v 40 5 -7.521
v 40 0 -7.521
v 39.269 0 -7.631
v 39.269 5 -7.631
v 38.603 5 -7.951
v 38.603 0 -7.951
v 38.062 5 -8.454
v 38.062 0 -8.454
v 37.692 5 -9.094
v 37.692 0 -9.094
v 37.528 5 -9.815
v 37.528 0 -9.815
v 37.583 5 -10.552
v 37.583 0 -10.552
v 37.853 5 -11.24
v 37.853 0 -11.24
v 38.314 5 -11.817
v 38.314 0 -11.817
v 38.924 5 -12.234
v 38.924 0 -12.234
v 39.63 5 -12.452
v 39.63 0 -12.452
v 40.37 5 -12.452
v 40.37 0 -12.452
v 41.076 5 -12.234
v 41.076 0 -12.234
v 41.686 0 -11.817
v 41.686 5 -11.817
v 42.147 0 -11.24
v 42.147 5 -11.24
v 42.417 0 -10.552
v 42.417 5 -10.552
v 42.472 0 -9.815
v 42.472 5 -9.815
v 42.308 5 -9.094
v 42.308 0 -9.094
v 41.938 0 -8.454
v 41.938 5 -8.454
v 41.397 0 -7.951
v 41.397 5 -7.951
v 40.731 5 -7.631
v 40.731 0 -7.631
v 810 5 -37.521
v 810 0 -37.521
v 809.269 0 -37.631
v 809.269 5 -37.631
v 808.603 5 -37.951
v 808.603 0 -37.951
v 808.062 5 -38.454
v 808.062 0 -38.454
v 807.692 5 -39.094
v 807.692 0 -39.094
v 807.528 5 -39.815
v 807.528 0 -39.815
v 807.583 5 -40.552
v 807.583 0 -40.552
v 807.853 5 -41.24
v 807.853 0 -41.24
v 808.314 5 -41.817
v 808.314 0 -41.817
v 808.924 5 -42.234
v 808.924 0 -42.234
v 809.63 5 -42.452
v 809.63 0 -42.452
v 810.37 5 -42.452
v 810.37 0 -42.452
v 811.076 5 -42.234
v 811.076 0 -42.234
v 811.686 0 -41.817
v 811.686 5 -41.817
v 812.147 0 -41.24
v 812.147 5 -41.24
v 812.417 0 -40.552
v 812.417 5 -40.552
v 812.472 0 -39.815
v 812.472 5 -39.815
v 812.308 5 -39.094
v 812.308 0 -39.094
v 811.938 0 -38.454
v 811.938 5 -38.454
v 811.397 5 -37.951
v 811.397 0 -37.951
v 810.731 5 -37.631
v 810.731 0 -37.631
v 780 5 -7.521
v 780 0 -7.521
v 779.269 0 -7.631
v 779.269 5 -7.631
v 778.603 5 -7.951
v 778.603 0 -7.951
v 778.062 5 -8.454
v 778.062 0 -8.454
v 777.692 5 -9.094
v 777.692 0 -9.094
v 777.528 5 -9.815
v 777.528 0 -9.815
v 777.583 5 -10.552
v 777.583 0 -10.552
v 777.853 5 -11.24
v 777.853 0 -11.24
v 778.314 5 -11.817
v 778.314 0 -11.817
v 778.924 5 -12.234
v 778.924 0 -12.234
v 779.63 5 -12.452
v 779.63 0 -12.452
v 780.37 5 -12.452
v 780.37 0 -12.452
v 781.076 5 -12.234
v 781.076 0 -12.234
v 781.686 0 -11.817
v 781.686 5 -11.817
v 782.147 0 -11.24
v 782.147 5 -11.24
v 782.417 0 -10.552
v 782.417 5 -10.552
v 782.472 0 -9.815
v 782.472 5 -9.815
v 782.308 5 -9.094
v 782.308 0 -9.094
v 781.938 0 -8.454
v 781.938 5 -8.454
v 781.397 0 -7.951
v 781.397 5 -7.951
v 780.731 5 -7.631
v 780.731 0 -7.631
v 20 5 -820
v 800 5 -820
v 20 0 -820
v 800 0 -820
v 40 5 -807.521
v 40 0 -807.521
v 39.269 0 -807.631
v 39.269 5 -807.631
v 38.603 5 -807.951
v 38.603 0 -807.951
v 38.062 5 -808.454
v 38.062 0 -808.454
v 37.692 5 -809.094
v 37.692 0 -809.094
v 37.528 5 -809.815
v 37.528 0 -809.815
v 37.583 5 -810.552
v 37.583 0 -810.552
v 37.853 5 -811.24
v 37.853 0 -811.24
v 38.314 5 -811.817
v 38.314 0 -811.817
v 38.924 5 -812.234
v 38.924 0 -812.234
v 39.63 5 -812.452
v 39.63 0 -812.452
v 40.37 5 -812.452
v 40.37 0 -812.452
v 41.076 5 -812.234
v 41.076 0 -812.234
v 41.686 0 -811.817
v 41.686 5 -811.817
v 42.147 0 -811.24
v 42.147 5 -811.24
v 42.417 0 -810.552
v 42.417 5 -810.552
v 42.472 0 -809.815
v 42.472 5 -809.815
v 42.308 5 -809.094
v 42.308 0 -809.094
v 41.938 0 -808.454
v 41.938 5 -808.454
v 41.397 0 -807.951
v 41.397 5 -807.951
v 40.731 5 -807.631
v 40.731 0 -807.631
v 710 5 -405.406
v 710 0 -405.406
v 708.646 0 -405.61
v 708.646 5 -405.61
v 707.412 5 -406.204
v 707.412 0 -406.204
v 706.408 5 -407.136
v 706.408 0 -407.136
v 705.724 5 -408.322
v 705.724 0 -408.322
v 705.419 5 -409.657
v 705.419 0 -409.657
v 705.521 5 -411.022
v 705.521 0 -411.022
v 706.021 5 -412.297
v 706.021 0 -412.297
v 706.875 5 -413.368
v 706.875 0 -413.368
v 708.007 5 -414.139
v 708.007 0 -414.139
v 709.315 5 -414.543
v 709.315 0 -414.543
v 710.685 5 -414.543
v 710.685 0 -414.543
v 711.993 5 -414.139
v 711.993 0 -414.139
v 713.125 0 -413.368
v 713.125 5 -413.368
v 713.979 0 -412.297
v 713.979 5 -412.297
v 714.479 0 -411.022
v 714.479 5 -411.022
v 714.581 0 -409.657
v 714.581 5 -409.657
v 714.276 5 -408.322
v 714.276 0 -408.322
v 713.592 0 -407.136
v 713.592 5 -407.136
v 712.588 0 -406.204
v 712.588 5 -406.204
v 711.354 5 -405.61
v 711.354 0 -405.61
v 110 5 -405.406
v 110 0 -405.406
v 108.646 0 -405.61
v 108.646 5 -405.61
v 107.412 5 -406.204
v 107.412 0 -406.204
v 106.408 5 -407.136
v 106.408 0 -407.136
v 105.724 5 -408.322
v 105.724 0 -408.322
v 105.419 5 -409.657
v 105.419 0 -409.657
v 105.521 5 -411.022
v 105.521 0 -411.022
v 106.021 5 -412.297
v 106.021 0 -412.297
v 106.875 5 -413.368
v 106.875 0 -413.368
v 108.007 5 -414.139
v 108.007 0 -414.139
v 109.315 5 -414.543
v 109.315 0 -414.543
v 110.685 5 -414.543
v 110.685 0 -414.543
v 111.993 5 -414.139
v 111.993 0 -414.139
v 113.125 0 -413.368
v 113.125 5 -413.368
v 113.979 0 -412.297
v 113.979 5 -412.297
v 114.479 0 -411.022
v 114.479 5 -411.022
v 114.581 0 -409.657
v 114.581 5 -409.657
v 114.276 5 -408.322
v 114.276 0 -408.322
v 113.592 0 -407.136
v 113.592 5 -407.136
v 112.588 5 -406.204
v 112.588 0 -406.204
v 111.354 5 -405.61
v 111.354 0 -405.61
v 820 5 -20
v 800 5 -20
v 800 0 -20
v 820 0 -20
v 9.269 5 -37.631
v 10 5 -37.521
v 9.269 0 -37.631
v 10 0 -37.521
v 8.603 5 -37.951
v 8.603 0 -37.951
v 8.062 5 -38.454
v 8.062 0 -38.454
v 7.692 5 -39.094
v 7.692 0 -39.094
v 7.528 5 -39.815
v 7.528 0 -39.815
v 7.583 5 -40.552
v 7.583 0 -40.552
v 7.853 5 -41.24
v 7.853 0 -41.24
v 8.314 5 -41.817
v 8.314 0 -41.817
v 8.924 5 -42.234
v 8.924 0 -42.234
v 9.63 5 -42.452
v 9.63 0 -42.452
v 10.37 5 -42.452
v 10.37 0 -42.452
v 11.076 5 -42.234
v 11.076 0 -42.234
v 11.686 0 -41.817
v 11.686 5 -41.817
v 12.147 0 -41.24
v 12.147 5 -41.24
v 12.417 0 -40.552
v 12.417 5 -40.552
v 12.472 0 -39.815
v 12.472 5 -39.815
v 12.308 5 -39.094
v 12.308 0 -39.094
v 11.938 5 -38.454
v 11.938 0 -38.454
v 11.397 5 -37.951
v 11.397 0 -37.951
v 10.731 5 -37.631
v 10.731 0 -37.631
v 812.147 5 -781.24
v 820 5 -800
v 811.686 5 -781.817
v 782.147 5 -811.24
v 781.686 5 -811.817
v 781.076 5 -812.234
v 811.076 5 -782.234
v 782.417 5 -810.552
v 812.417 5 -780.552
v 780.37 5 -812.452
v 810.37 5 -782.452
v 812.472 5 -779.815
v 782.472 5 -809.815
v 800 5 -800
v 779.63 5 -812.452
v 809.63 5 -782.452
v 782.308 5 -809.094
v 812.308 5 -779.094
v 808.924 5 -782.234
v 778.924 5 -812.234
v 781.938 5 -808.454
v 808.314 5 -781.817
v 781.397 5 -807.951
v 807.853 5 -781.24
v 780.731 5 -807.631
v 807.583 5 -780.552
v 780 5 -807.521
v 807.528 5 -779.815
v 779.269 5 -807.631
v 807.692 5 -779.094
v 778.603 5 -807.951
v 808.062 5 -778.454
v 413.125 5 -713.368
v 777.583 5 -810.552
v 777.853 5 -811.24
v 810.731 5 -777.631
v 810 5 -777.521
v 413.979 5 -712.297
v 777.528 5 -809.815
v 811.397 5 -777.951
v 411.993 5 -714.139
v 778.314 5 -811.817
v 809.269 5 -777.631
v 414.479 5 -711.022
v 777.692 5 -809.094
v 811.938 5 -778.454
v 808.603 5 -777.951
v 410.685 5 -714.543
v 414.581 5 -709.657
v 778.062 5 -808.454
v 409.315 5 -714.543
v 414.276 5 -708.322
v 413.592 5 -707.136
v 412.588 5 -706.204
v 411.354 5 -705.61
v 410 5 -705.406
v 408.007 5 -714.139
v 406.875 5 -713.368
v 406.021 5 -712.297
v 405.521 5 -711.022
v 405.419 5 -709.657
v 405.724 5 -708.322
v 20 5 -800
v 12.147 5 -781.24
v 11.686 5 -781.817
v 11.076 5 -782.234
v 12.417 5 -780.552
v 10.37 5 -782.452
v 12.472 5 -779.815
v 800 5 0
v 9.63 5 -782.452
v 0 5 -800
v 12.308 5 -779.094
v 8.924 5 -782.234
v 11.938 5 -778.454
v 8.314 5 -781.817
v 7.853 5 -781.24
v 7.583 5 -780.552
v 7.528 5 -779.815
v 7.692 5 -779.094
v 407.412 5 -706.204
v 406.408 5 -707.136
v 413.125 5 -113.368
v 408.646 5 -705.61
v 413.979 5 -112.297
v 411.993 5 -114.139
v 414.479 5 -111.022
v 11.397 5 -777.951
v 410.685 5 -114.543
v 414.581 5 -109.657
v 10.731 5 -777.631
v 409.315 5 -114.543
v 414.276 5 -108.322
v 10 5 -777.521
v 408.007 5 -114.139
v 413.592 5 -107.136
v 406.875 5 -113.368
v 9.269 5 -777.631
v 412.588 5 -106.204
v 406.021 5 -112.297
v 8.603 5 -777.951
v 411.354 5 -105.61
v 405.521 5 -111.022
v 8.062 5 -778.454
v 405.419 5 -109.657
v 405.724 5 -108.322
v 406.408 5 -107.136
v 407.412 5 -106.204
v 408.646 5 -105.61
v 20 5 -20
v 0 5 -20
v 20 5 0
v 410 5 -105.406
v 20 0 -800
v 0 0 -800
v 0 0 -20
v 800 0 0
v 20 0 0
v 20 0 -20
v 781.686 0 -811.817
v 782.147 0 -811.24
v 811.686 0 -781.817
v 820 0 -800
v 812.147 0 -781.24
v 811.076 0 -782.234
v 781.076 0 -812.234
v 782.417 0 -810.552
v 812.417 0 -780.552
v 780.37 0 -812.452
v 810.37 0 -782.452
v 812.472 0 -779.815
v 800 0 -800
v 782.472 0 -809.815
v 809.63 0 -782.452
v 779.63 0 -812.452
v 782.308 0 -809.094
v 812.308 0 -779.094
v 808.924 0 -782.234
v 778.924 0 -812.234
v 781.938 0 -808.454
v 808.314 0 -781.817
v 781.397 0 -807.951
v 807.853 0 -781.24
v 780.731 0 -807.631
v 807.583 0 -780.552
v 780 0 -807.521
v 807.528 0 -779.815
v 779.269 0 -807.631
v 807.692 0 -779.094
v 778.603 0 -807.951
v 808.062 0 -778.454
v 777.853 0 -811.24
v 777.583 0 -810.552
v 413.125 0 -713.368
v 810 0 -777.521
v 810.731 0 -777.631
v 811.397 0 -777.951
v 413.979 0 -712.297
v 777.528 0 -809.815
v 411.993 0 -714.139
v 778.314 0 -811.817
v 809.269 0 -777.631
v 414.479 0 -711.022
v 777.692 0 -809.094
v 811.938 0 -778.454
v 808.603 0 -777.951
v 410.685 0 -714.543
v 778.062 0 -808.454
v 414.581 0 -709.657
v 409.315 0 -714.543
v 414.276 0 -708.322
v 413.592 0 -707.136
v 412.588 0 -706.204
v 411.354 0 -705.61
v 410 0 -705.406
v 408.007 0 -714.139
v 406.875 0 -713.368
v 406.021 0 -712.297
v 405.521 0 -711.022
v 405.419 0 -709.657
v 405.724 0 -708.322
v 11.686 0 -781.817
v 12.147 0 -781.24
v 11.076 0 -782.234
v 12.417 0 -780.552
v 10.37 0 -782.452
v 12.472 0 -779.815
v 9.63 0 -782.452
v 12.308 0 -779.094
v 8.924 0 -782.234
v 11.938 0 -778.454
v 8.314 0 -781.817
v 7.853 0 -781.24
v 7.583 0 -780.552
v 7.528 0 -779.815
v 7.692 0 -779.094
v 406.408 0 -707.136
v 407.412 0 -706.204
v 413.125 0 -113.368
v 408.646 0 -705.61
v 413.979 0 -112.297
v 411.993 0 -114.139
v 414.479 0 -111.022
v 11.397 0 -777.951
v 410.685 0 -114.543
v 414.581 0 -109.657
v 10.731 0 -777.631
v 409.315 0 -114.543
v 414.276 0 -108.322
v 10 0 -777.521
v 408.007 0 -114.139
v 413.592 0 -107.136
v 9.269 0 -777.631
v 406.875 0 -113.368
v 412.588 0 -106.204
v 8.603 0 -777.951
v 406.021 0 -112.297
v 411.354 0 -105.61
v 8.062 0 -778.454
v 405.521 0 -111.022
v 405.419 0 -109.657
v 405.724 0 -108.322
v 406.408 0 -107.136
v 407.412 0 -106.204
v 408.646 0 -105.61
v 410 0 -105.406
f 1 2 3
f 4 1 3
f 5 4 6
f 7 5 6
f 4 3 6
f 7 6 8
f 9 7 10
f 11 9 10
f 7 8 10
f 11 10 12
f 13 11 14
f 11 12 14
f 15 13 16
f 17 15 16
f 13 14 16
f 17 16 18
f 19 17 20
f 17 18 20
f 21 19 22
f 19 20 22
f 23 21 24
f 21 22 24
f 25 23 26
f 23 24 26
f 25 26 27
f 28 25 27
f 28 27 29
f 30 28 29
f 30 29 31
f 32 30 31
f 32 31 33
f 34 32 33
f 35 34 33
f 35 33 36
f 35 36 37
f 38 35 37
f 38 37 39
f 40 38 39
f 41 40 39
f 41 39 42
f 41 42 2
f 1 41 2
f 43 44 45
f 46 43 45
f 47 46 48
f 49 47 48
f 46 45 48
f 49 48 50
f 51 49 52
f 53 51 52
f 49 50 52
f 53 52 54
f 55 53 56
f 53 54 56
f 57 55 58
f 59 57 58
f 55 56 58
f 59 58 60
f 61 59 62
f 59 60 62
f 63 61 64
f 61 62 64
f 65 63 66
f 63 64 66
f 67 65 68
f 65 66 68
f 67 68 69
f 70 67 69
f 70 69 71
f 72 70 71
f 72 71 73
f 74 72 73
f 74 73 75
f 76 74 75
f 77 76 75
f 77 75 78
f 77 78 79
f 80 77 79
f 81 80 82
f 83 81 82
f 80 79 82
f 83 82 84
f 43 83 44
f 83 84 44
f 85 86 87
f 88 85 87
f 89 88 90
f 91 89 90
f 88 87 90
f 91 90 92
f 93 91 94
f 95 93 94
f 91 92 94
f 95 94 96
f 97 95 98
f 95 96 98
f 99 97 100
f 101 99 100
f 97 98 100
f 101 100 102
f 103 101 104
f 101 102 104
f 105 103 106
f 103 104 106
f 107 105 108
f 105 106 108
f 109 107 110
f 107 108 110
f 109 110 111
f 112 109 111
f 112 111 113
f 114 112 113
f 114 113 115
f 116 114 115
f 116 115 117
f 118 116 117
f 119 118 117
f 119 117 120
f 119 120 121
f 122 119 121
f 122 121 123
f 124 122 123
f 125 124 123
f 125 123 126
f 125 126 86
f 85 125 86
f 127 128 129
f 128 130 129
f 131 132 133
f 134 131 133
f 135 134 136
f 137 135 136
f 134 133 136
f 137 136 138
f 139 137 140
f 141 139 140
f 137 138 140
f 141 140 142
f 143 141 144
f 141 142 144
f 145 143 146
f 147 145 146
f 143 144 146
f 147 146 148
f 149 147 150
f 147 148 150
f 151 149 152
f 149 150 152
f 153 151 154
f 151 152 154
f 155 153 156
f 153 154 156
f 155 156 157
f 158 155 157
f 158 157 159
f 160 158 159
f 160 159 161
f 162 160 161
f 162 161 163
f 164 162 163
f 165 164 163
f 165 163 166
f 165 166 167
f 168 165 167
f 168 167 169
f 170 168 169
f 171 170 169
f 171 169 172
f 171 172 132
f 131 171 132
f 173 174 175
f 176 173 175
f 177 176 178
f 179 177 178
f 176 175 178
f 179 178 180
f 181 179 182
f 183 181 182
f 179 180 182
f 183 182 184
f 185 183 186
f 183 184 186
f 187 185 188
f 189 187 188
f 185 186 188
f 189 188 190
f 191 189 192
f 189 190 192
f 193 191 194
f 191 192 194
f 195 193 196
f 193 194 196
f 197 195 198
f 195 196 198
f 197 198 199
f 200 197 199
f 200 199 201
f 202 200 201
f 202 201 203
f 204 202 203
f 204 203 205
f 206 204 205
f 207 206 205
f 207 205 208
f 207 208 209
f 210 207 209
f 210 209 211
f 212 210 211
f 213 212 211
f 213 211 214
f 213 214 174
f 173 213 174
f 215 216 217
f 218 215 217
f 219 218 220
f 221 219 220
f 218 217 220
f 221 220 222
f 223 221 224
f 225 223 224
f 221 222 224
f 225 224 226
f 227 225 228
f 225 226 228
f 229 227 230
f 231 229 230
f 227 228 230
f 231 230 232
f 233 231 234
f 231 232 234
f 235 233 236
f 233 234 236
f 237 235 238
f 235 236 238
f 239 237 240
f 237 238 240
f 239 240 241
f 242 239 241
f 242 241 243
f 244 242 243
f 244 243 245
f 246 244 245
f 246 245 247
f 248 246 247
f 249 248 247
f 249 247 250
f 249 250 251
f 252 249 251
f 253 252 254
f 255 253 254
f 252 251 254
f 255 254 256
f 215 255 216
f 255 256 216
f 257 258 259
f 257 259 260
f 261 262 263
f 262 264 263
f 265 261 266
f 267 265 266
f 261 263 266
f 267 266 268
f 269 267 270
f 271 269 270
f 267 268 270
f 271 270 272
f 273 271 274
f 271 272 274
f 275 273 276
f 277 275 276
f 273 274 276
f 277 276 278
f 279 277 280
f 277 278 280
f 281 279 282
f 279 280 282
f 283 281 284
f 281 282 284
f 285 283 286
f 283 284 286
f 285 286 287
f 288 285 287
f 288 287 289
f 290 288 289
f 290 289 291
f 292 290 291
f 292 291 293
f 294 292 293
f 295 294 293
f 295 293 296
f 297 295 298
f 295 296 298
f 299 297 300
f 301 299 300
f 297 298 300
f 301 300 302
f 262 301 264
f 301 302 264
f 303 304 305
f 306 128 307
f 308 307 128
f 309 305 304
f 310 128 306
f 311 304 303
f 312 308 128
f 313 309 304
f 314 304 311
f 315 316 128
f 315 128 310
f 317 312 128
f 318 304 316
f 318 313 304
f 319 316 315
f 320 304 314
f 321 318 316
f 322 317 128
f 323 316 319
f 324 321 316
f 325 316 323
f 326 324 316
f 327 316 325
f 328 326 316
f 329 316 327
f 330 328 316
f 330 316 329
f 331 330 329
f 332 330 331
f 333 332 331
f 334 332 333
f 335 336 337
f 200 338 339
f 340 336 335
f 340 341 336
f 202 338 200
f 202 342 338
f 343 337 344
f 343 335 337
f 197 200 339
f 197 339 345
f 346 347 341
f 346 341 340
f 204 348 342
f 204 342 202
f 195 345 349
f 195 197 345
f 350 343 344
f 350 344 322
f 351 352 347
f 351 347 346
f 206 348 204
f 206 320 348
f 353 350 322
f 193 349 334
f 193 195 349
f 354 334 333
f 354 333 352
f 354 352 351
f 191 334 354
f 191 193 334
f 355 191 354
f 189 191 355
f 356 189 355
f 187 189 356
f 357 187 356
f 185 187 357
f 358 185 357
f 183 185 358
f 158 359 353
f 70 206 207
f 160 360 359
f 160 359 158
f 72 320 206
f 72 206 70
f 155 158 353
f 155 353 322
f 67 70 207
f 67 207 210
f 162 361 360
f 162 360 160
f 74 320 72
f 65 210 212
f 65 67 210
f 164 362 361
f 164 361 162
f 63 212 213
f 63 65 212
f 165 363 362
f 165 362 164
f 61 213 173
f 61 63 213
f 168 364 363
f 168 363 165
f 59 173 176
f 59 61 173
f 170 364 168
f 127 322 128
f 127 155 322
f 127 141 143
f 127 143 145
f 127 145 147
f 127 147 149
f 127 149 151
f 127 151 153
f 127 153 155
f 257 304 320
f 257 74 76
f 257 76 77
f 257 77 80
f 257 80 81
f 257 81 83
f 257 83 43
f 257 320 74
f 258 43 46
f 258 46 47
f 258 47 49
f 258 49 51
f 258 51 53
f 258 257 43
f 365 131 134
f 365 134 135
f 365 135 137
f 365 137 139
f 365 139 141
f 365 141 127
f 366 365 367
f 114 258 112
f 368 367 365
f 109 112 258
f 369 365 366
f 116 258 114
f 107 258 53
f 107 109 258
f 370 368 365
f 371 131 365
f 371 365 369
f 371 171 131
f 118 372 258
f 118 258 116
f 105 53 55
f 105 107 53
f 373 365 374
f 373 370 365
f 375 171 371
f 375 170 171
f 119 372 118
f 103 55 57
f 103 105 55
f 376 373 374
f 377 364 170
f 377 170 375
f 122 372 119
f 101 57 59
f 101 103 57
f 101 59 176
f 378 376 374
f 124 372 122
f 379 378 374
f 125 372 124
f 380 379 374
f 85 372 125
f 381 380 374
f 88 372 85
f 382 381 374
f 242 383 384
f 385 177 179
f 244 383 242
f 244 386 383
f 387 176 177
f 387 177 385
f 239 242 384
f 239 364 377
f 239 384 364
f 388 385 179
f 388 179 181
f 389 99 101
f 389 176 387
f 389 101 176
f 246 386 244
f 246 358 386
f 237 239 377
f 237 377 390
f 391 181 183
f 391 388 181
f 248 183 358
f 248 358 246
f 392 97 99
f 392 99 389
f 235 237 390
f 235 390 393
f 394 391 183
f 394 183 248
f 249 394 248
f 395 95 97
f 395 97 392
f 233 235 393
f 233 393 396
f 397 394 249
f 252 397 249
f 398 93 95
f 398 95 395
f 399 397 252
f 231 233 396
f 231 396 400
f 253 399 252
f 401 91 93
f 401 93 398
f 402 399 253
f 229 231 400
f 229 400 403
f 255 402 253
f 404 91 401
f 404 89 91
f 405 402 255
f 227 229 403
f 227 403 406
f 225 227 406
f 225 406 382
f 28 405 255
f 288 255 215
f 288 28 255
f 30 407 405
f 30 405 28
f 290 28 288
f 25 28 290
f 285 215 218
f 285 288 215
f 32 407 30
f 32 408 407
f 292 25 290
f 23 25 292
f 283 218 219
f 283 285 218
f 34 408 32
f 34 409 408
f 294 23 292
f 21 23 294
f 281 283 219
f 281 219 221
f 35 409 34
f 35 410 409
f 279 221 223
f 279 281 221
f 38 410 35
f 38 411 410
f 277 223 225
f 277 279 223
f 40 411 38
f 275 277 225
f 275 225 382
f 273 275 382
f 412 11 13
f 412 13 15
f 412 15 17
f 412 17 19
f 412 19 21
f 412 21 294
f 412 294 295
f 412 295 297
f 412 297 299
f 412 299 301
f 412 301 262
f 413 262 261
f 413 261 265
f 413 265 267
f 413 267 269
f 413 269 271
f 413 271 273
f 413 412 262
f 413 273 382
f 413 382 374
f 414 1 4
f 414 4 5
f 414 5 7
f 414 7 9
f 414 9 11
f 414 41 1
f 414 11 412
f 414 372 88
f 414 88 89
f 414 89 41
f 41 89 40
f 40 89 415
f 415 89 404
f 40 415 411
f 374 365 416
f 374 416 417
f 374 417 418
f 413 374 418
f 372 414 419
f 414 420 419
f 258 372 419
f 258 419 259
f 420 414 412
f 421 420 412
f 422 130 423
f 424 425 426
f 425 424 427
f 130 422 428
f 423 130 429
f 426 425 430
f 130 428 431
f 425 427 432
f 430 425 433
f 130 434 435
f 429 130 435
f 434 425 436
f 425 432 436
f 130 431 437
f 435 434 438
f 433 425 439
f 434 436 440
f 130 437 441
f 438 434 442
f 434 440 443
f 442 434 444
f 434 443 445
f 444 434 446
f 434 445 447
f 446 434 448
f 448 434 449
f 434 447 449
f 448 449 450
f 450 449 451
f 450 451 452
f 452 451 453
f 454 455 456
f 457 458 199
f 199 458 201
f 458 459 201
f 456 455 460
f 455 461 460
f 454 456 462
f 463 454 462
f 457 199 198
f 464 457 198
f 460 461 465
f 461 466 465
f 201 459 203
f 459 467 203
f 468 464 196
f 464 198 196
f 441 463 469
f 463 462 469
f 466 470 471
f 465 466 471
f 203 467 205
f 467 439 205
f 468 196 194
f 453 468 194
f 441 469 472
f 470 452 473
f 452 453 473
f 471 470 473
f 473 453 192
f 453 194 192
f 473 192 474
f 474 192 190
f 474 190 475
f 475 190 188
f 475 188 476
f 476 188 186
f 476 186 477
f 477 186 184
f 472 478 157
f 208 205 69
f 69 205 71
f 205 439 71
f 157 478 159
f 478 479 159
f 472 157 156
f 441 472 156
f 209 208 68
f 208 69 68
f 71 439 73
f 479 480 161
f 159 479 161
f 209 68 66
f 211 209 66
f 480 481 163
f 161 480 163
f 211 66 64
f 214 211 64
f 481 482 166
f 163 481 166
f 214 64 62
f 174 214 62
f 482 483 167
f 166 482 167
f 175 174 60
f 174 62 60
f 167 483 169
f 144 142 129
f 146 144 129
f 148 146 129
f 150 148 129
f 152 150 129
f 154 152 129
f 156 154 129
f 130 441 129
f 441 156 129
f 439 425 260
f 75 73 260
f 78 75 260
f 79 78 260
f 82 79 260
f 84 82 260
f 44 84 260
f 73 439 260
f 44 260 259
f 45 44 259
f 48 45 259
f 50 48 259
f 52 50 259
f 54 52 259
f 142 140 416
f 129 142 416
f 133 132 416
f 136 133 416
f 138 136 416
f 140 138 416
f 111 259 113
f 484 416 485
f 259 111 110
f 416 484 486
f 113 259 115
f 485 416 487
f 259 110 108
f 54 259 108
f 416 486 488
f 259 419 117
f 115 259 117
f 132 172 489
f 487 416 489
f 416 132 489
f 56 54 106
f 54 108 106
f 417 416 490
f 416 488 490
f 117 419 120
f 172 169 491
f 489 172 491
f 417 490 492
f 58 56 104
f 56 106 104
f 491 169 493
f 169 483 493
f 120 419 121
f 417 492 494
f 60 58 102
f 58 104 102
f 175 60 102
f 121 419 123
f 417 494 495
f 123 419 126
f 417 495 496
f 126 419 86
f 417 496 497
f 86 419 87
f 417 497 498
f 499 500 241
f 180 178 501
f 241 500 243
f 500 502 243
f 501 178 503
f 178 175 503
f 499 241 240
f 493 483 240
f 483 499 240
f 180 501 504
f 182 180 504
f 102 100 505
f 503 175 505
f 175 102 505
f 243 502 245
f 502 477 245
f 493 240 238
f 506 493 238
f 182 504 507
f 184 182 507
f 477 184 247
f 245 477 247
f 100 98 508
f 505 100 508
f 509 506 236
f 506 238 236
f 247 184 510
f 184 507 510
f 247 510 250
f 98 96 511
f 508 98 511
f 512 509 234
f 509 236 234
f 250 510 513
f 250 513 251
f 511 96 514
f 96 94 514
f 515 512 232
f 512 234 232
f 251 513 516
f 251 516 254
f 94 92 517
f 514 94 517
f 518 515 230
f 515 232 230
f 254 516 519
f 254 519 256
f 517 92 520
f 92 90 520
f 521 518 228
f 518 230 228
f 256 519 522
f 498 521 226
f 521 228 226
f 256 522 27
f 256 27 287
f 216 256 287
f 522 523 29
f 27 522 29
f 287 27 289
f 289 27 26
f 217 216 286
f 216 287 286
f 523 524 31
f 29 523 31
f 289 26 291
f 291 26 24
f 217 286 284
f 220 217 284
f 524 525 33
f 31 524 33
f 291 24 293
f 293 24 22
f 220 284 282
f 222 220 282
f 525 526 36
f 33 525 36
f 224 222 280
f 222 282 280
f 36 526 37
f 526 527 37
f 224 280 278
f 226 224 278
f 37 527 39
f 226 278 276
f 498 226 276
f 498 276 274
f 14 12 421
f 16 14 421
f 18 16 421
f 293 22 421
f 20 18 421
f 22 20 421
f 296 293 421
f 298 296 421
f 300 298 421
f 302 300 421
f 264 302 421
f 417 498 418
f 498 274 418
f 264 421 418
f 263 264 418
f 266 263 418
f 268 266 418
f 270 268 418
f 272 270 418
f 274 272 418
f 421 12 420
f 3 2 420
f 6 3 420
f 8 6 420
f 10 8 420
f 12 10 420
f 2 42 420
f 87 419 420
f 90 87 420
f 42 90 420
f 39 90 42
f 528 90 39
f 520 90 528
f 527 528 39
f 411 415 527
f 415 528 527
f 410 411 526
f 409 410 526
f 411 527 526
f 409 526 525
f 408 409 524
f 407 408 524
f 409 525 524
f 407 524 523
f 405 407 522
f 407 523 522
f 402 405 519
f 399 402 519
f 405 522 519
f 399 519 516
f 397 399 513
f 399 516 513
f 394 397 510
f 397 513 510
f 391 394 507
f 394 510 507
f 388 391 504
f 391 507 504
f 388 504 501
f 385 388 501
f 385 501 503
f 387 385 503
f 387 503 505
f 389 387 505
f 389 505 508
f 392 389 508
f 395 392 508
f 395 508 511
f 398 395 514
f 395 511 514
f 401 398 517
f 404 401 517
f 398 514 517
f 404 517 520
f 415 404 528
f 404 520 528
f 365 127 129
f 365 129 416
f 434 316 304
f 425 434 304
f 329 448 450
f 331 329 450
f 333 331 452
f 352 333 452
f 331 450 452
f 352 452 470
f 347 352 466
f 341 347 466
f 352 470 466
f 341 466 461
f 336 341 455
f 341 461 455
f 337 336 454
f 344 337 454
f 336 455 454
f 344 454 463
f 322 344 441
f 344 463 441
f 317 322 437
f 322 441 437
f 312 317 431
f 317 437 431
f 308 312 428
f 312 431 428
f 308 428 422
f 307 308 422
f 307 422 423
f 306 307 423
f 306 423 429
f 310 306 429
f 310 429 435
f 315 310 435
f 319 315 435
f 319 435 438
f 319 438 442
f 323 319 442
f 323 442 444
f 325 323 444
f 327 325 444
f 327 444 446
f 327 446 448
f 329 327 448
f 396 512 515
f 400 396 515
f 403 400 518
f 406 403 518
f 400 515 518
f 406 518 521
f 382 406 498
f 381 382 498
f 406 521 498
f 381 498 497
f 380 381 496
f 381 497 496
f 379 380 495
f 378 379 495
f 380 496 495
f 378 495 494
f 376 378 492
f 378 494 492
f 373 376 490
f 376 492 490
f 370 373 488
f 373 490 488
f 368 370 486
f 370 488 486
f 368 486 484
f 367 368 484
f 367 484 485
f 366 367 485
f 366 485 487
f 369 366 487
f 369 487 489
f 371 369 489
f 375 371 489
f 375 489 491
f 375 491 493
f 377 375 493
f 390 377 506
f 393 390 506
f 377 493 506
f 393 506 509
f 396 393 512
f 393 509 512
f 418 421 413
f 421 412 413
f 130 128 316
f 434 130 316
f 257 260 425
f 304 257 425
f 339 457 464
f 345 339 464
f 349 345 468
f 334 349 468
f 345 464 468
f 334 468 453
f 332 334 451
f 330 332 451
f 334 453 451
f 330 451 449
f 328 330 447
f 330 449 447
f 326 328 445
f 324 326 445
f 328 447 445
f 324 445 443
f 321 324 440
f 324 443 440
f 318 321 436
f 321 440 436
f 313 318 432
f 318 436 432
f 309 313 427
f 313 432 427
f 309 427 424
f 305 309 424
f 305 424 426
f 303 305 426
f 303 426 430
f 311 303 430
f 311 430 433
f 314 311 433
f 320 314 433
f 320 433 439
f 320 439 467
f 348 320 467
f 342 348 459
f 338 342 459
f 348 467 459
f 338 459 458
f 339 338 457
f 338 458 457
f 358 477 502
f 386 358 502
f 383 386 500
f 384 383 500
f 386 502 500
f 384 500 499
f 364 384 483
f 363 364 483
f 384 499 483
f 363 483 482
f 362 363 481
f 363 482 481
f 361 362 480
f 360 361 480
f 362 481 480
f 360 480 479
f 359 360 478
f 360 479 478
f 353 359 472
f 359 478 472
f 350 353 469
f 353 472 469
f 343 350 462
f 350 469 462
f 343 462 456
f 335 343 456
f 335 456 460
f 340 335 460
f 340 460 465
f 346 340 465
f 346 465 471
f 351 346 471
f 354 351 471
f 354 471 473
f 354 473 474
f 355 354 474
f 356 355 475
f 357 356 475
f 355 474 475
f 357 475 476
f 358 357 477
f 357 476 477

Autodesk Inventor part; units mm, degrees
ref_plane "YZ Plane" through (0, 0, 0) normal (1, 0, 0) x (0, 1, 0)
ref_plane "XZ Plane" through (0, 0, 0) normal (0, 1, 0) x (-1, 0, 0)
ref_plane "XY Plane" through (0, 0, 0) normal (0, 0, 1) x (1, 0, 0)
sketch "草图1" plane through (0, 0, 0) normal (0, 1, 0) x (-1, 0, 0)
  line L0 (0, 0) -> (-820, 0)
  line L1 (-820, 0) -> (-820, -820)
  line L2 (-820, -820) -> (0, -820)
  line L3 (0, -820) -> (0, 0)
  dimension "d0" = 820
  dimension "d1" = 820
extrude "拉伸1" add sketch "草图1" along normal blind 5
sketch "草图2" plane through (0, 5, 0) normal (0, 1, 0) x (1, 0, 0)
  line L0 (0, 0) -> (820, 0) projected
  line L1 (0, 0) -> (20, 0)
  line L2 (20, 0) -> (20, 20)
  line L3 (20, 20) -> (0, 20)
  line L4 (0, 20) -> (0, 0)
  line L5 (820, 0) -> (800, 0)
  line L6 (800, 0) -> (800, 20)
  line L7 (800, 20) -> (820, 20)
  line L8 (820, 20) -> (820, 0)
  line L9 (820, 820) -> (0, 820) projected
  line L10 (820, 820) -> (800, 820)
  line L11 (800, 820) -> (800, 800)
  line L12 (800, 800) -> (820, 800)
  line L13 (820, 800) -> (820, 820)
  line L14 (0, 820) -> (20, 820)
  line L15 (20, 820) -> (20, 800)
  line L16 (20, 800) -> (0, 800)
  line L17 (0, 800) -> (0, 820)
  dimension "d4" = 20
  dimension "d5" = 20
  dimension "d6" = 20
  dimension "d7" = 20
  dimension "d8" = 20
  dimension "d9" = 20
  dimension "d10" = 20
  dimension "d11" = 20
extrude "拉伸2" cut sketch "草图2" against normal blind 5
sketch "草图3" plane through (0, 5, 0) normal (0, 1, 0) x (1, 0, 0)
  line L0 (20, 0) -> (800, 0) projected
  line L1 (0, 800) -> (0, 20) projected
  line L2 (820, 20) -> (820, 800) projected
  line L3 (800, 820) -> (20, 820) projected
  point P0 (0, 0)
  point P1 (40, 10)
  point P2 (780, 10)
  point P3 (810, 780)
  point P4 (780, 810)
  point P5 (40, 810)
  point P6 (10, 780)
  point P7 (10, 40)
  point P8 (810, 40)
  dimension "d14" = 10
  dimension "d15" = 40
  dimension "d16" = 10
  dimension "d17" = 40
  dimension "d18" = 10
  dimension "d19" = 40
  dimension "d20" = 10
  dimension "d21" = 40
  dimension "d22" = 10
  dimension "d23" = 40
  dimension "d24" = 10
  dimension "d25" = 40
  dimension "d26" = 10
  dimension "d27" = 40
  dimension "d28" = 10
  dimension "d29" = 40
hole "孔1" at (40, 5, -10) at (780, 5, -10) at (810, 5, -780) at (780, 5, -810) at (40, 5, -810) at (10, 5, -780) at (10, 5, -40) at (810, 5, -40) direction (0, -1, 0) diameter 4.9587 depth 13.8 tip angle 118 thread size "M5.5x0.5" class "6H" standard "GB Metric profile"
sketch "草图5" plane through (0, 5, 0) normal (0, 1, 0) x (1, 0, 0)
  circle A0 centre (410, 410) radius 300
  line L0 (820, 20) -> (820, 800) projected
  line L1 (800, 820) -> (20, 820) projected
  line L2 (410, 410) -> (710, 410)
  circle A1 centre (410, 410) radius 300
  circle A2 centre (410, 410) radius 300
  circle A3 centre (410, 410) radius 300
  point P0 (0, 0)
  point P1 (410, 710)
  point P2 (410, 710)
  point P3 (110, 410)
  point P4 (110, 410)
  point P5 (410, 110)
  point P6 (410, 110)
  dimension "d57" = 600
  dimension "d58" = 410
  dimension "d59" = 410
  dimension "d62" = 360
hole "孔3" at (710, 5, -410) at (410, 5, -710) at (110, 5, -410) at (410, 5, -110) direction (0, -1, 0) diameter 9.188 depth 24 tip angle 118 thread size "M10x0.75" class "6H" standard "GB Metric profile"
properties part number "底板"
